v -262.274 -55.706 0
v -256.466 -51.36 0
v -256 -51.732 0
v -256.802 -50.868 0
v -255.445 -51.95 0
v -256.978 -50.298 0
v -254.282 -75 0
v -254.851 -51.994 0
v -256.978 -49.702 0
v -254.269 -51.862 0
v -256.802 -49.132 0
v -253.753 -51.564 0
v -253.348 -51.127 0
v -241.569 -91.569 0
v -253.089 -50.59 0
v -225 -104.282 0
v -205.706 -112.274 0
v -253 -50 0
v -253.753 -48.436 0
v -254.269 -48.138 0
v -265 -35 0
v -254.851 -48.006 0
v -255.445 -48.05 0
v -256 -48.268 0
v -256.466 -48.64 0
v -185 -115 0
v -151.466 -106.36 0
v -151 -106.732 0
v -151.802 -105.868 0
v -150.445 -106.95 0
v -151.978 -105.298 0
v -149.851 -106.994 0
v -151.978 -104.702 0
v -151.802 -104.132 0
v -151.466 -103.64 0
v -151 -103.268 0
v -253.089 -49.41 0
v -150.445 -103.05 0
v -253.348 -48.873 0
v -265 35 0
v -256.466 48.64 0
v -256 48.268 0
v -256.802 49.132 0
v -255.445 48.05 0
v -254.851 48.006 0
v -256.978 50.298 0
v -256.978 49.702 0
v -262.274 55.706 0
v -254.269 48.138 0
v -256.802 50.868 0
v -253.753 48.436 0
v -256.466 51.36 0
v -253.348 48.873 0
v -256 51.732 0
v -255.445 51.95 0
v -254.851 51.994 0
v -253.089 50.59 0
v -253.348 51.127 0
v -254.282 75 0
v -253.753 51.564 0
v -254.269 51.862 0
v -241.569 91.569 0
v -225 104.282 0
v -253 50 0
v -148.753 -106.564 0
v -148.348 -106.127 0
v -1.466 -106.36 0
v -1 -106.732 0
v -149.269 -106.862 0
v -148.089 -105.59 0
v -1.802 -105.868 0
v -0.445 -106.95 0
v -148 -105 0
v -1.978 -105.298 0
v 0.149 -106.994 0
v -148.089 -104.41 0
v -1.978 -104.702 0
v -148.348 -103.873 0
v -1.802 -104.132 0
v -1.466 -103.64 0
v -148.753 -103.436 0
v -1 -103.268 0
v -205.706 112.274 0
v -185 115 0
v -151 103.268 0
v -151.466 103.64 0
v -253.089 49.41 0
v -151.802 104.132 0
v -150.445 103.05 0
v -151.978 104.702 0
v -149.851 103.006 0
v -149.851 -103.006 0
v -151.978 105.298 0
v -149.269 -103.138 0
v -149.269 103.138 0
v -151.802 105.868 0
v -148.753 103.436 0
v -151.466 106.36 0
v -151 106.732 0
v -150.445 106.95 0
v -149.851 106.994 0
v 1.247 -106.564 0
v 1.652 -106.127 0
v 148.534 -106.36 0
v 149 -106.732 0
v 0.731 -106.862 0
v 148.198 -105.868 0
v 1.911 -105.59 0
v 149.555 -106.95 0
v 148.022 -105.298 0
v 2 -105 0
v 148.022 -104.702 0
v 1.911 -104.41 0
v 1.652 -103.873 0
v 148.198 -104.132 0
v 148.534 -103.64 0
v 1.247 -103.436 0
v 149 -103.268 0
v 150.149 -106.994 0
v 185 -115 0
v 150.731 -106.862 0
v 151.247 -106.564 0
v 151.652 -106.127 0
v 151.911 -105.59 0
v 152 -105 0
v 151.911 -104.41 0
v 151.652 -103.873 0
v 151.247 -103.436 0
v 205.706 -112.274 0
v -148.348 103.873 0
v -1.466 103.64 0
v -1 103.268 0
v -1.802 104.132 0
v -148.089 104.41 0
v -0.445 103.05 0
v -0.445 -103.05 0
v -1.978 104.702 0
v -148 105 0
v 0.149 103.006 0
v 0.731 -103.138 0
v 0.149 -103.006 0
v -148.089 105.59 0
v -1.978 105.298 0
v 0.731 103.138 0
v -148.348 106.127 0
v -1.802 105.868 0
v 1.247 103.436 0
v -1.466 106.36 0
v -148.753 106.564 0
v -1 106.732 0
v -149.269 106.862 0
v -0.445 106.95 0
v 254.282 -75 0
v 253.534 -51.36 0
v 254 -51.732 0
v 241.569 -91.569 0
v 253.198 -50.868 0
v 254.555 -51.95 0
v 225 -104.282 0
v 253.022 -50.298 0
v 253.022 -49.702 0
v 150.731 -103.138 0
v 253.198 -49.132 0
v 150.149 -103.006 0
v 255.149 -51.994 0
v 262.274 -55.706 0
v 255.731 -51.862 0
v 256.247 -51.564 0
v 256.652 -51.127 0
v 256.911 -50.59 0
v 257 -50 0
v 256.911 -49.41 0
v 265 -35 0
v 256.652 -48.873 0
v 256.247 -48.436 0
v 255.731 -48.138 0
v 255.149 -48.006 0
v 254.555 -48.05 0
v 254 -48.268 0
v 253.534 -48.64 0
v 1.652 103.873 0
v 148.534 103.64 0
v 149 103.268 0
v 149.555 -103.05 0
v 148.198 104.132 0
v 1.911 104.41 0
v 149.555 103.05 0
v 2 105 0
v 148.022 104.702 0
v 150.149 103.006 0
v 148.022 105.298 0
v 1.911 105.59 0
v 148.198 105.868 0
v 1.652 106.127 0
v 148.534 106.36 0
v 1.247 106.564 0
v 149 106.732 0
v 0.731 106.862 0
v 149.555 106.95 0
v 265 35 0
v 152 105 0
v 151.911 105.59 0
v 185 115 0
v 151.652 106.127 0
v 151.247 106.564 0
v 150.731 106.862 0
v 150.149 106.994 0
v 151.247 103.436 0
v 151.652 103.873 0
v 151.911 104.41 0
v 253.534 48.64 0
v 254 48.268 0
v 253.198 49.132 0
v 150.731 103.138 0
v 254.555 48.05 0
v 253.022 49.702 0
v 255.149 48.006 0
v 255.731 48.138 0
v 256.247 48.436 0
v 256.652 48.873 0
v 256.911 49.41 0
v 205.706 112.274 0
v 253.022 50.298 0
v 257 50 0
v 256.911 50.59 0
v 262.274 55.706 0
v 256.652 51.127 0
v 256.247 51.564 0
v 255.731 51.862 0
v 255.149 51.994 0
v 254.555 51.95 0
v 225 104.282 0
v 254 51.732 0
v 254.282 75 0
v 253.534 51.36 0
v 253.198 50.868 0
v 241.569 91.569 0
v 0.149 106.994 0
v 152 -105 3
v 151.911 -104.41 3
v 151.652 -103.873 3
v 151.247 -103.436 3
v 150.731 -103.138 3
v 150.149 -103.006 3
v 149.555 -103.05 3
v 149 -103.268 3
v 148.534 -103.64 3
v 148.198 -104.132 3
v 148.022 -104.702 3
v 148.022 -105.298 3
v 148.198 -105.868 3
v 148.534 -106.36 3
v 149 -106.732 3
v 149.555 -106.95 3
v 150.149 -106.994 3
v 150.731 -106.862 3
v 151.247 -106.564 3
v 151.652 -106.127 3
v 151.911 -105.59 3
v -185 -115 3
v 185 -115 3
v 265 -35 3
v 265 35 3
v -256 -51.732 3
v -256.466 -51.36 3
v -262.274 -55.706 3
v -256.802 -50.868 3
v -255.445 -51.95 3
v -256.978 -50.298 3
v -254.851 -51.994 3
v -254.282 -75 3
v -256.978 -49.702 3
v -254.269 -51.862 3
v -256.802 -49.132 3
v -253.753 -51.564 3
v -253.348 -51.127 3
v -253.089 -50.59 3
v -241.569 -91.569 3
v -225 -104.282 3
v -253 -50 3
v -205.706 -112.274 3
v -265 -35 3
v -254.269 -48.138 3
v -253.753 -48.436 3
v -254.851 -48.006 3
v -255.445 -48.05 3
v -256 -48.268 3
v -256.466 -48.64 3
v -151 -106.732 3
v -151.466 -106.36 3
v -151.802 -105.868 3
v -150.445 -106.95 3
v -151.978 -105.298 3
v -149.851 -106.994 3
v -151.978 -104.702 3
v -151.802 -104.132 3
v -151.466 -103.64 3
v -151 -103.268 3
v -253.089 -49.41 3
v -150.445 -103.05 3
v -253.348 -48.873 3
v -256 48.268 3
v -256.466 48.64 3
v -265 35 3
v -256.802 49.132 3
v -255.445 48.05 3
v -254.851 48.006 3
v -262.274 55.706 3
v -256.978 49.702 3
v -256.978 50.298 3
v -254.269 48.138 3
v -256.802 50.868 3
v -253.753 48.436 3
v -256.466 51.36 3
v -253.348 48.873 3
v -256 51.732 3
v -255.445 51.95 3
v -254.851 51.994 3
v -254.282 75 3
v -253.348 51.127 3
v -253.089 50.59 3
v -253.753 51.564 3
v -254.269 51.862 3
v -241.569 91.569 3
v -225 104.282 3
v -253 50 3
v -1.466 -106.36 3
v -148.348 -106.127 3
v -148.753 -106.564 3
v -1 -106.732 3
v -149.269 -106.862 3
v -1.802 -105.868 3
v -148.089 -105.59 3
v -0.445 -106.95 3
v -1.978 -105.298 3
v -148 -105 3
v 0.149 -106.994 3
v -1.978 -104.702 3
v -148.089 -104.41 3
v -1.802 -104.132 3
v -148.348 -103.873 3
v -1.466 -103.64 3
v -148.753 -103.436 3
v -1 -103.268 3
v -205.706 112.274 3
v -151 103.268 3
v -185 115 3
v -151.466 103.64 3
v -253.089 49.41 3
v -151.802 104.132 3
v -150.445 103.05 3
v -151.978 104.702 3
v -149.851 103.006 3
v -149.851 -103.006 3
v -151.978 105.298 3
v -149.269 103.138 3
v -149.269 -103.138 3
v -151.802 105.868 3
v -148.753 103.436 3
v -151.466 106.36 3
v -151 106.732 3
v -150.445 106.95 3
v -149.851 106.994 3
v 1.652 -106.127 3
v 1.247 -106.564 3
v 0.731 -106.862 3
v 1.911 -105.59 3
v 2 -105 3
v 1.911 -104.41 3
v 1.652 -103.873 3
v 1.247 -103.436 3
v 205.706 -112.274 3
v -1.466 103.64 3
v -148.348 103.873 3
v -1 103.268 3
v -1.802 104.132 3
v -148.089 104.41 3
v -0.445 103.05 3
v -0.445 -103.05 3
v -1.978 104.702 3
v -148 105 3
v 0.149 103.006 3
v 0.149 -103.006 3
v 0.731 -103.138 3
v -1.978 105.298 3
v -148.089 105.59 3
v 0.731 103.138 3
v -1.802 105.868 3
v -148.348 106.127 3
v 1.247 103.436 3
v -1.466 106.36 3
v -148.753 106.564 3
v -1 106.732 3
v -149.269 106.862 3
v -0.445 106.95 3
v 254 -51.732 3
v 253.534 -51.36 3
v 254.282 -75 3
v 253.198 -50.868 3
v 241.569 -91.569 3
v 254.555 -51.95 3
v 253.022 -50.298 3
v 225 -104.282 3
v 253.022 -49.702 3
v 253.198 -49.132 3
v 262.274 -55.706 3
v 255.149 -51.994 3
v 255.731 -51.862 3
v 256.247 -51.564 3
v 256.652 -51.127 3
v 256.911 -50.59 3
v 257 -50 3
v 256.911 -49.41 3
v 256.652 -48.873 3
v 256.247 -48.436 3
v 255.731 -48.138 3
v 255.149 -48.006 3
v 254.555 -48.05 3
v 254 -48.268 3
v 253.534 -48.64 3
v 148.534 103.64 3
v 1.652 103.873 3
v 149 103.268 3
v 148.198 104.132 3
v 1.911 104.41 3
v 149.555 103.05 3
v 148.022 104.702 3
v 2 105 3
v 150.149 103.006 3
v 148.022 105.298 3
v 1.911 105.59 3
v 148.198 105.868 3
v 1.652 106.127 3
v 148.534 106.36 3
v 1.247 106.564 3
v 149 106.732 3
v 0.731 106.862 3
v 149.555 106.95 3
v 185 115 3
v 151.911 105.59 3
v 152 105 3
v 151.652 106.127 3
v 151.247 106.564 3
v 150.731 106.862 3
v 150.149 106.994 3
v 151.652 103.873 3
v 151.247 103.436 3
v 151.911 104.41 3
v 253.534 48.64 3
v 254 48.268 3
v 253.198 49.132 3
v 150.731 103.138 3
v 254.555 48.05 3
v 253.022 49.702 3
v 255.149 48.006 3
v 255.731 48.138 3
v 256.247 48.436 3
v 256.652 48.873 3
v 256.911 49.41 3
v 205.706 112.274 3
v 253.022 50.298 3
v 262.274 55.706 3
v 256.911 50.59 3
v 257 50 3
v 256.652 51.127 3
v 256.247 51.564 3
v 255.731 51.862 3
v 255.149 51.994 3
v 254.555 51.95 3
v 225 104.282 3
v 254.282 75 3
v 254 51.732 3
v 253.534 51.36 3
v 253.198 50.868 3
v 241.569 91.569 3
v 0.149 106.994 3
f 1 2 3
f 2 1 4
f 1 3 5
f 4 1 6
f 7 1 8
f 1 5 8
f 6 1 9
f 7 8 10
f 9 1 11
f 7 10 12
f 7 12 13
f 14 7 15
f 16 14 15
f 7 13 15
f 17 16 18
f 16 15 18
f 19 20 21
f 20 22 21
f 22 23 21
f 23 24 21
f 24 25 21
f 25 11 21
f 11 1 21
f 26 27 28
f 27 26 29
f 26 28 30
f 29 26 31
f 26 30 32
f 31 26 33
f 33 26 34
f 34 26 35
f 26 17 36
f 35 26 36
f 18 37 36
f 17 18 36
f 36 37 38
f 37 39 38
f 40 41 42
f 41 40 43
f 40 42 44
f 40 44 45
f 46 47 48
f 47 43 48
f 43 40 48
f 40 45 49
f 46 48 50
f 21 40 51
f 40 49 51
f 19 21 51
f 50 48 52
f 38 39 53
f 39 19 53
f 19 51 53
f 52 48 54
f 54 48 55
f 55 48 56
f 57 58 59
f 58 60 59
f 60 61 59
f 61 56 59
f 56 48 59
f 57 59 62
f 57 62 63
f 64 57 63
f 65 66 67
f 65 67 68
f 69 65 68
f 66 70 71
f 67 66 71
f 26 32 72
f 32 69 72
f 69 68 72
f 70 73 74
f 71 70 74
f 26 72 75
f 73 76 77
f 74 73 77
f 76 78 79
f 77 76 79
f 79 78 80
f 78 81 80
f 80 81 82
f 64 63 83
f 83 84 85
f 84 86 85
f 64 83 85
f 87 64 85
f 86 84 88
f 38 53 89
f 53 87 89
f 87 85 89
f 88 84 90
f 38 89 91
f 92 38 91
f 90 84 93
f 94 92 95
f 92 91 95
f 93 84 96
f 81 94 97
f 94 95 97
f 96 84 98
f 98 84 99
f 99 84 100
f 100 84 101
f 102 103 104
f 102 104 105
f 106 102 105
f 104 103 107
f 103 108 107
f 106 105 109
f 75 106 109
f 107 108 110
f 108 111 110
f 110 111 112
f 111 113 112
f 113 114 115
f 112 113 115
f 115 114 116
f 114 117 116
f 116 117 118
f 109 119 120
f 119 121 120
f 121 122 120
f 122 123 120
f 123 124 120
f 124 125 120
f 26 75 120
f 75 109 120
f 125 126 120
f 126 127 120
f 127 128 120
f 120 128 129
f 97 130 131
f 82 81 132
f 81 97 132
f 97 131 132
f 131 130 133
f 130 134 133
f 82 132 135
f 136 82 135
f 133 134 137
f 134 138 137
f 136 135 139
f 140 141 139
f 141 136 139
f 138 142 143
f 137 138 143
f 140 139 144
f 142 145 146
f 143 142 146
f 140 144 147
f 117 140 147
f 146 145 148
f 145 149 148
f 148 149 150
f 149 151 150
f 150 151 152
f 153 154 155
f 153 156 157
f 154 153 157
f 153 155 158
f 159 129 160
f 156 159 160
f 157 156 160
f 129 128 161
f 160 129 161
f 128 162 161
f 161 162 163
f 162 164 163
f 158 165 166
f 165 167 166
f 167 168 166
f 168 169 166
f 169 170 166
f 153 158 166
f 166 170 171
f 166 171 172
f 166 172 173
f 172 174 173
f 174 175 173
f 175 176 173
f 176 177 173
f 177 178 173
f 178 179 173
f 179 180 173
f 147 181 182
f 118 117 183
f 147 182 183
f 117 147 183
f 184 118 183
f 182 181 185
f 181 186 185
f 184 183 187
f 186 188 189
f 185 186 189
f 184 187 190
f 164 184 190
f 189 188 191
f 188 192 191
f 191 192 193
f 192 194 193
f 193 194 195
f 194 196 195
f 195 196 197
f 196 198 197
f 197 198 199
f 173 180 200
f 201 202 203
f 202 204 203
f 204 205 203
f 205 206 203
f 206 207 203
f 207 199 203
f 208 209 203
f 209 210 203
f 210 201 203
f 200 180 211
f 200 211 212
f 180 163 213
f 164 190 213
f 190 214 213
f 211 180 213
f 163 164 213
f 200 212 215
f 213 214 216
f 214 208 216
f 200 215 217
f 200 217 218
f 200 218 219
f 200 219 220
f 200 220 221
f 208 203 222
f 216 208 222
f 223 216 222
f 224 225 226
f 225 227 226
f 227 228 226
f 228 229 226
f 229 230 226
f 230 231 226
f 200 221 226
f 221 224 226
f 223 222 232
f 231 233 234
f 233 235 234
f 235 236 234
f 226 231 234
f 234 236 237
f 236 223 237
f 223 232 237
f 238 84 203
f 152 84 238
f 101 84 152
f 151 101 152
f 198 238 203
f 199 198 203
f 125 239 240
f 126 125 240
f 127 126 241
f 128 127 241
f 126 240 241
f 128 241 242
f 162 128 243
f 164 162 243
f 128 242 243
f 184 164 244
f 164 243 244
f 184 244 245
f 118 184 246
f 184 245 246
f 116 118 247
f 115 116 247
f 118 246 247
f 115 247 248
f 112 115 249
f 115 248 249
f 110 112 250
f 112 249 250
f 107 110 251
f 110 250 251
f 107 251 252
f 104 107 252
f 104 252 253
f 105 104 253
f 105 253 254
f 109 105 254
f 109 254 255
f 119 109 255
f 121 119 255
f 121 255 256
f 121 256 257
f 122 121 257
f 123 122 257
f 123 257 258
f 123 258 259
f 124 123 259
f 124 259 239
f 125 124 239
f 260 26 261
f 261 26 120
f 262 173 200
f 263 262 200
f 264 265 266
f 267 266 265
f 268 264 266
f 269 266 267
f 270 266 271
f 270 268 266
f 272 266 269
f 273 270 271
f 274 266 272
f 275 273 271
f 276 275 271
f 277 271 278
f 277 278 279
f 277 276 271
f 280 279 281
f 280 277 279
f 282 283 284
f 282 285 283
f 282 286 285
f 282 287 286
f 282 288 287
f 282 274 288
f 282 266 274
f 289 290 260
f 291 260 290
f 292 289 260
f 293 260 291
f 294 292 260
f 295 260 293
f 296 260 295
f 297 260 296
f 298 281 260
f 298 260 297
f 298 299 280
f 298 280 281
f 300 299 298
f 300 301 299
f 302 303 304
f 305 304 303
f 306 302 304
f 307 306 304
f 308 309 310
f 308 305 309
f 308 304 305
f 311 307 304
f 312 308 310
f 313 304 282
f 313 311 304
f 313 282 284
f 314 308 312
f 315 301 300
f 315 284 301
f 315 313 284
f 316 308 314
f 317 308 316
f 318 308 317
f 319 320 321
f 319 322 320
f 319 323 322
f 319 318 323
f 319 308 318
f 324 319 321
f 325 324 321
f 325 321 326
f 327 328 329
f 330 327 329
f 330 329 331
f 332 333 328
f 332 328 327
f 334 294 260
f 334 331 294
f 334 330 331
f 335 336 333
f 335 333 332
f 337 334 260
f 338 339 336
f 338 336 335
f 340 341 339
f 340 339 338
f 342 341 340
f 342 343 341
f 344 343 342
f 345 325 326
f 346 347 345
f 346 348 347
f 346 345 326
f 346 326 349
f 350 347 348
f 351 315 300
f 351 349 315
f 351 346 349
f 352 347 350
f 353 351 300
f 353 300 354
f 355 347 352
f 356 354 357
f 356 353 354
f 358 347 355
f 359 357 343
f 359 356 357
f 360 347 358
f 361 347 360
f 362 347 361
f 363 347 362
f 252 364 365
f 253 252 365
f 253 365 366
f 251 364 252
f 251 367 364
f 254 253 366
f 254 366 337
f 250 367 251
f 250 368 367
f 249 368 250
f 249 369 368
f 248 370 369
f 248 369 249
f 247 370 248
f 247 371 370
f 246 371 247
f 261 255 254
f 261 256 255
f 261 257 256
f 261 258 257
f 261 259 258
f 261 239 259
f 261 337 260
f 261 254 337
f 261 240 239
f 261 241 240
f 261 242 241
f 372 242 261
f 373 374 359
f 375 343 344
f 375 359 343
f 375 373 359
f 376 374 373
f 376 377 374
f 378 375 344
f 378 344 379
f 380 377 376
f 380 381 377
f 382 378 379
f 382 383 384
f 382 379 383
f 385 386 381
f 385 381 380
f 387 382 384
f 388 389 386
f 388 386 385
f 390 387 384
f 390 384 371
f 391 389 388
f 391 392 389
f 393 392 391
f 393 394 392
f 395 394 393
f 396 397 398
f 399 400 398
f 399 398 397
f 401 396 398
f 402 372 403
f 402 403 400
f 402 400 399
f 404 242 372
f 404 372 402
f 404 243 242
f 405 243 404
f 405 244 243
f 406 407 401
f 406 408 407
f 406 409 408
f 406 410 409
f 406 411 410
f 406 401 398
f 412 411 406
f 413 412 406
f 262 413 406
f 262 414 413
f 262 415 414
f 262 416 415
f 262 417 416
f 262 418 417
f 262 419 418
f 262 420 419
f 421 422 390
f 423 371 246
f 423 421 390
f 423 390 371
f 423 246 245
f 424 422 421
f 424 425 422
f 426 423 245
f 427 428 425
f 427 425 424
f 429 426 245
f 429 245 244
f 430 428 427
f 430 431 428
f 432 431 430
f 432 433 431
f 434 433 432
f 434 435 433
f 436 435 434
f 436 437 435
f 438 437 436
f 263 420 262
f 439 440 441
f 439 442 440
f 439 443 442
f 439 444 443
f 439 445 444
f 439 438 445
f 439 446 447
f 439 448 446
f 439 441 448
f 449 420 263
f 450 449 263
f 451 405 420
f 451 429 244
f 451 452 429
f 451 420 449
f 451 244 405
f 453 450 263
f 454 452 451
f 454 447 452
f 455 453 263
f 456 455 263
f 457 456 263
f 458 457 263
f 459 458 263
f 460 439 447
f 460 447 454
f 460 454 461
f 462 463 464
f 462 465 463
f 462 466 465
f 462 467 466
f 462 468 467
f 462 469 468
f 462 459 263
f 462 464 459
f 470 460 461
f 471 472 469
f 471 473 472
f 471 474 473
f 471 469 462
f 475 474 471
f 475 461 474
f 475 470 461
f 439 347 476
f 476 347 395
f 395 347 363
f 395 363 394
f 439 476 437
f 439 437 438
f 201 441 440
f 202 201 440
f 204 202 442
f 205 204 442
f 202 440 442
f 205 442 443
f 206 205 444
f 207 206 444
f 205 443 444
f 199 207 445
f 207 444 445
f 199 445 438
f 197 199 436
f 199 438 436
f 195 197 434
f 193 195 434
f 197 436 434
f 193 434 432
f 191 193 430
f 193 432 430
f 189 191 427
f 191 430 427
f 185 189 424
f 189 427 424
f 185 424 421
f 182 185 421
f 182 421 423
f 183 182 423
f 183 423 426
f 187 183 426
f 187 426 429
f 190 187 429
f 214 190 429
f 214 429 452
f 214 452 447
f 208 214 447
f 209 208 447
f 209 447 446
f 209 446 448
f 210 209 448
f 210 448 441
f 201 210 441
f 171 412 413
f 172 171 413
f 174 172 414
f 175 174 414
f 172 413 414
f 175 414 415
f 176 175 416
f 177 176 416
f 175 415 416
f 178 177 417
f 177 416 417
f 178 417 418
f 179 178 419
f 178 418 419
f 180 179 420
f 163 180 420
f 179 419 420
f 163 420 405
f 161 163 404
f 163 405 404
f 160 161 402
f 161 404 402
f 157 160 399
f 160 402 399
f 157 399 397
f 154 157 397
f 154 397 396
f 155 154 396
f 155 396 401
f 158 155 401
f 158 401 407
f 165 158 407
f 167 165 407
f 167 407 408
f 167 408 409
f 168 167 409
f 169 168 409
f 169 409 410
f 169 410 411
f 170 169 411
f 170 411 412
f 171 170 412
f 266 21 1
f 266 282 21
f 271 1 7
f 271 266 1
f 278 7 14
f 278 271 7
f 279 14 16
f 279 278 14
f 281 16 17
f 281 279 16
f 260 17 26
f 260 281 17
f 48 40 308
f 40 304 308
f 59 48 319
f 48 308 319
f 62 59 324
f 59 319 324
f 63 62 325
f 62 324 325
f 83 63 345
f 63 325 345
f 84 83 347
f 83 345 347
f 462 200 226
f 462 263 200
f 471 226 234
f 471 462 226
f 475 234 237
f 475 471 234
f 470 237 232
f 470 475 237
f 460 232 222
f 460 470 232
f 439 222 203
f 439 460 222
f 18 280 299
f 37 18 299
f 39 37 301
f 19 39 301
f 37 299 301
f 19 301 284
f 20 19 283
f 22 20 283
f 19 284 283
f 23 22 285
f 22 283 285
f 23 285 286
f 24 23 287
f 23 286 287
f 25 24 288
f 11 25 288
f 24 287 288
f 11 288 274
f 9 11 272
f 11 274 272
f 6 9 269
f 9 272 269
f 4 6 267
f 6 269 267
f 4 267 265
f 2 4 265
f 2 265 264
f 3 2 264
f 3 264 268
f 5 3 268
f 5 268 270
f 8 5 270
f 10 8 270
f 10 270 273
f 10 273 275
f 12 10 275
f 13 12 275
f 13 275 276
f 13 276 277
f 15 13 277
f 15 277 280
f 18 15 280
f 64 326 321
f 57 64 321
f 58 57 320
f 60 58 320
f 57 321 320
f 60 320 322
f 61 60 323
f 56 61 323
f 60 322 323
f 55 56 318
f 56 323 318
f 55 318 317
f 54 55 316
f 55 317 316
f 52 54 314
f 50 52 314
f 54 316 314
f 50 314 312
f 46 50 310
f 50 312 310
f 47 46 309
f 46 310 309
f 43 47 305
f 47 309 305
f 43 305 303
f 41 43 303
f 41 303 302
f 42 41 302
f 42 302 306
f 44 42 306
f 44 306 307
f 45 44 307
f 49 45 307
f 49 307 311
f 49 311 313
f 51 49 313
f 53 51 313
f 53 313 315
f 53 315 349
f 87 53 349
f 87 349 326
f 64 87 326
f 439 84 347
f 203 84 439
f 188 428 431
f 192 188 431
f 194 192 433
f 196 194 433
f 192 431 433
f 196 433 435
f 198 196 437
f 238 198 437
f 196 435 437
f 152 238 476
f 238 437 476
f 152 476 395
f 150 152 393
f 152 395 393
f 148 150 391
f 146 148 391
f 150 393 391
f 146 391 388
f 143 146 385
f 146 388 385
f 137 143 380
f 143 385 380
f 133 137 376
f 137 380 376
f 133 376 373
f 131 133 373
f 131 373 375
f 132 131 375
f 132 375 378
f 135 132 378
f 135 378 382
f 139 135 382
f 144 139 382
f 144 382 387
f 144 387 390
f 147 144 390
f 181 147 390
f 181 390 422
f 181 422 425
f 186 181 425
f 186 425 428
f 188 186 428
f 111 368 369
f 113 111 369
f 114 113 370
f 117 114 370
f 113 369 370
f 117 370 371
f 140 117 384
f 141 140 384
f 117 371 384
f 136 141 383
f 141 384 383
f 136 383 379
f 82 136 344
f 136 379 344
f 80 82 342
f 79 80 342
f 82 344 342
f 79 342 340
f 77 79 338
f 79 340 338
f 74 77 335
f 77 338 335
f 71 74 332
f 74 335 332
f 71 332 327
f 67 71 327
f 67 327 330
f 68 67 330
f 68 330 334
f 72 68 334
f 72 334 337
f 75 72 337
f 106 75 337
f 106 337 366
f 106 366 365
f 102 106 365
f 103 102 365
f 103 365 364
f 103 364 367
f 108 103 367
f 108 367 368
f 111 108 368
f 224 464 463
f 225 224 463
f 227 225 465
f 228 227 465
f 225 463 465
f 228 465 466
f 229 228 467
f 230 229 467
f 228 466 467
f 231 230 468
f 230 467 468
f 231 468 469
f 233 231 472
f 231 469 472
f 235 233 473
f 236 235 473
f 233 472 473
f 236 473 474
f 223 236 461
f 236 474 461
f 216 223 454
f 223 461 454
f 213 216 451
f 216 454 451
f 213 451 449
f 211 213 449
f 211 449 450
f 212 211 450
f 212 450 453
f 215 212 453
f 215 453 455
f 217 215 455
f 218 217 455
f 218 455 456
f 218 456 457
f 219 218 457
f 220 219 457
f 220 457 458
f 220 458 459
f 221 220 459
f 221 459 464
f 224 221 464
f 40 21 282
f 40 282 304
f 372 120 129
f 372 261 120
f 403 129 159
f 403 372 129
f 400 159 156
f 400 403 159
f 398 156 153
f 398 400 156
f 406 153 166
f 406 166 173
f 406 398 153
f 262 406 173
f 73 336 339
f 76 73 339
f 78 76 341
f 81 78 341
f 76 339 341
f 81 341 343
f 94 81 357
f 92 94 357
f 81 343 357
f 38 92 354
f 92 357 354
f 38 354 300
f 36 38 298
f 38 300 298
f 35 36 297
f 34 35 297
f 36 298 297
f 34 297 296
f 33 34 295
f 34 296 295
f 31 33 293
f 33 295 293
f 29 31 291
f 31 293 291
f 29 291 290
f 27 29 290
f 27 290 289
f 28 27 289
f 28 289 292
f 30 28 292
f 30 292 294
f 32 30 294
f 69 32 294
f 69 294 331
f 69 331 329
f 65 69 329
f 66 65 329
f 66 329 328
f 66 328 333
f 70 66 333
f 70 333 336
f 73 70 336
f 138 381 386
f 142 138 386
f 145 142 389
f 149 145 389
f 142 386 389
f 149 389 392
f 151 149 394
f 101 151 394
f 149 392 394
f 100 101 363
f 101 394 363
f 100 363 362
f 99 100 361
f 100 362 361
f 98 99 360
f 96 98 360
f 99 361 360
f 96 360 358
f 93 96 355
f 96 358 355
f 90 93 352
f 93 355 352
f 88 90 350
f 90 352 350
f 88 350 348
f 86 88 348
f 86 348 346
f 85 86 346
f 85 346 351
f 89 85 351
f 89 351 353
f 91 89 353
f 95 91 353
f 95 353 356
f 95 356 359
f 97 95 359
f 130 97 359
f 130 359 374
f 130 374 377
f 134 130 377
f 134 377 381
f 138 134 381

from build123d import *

# Parameters (mm, degrees)
SKETCH_1_W          = 530
SKETCH_1_H          = 230
EXTRUDE_1_DEPTH     = 3
FILLET_1_R          = 80
SKETCH_2_R          = 2
CUT_EXTRUDE_1_DEPTH = 10


with BuildPart() as part:
    # 草图1 → 凸台-拉伸1 (new body)
    with BuildSketch(Plane.XY):
        Rectangle(SKETCH_1_W, SKETCH_1_H)
    extrude(amount=EXTRUDE_1_DEPTH)

    # 圆角1
    fillet_1_edges = [part.edges().sort_by_distance(p)[0] for p in [
        (265, -115, 1.5),
        (-265, -115, 1.5),
        (-265, 115, 1.5),
        (265, 115, 1.5),
    ]]
    fillet(fillet_1_edges, radius=FILLET_1_R)

    # 草图2 → 切除-拉伸1 (cut)
    with BuildSketch(Plane.XY.offset(3)):
        with Locations((-255, -50)):
            Circle(SKETCH_2_R)
        with Locations((-255, 50)):
            Circle(SKETCH_2_R)
        with Locations((-150, -105)):
            Circle(SKETCH_2_R)
        with Locations((0, -105)):
            Circle(SKETCH_2_R)
        with Locations((150, -105)):
            Circle(SKETCH_2_R)
        with Locations((255, -50)):
            Circle(SKETCH_2_R)
        with Locations((255, 50)):
            Circle(SKETCH_2_R)
        with Locations((150, 105)):
            Circle(SKETCH_2_R)
        with Locations((0, 105)):
            Circle(SKETCH_2_R)
        with Locations((-150, 105)):
            Circle(SKETCH_2_R)
    extrude(amount=-CUT_EXTRUDE_1_DEPTH, mode=Mode.SUBTRACT)


solid = part.part
